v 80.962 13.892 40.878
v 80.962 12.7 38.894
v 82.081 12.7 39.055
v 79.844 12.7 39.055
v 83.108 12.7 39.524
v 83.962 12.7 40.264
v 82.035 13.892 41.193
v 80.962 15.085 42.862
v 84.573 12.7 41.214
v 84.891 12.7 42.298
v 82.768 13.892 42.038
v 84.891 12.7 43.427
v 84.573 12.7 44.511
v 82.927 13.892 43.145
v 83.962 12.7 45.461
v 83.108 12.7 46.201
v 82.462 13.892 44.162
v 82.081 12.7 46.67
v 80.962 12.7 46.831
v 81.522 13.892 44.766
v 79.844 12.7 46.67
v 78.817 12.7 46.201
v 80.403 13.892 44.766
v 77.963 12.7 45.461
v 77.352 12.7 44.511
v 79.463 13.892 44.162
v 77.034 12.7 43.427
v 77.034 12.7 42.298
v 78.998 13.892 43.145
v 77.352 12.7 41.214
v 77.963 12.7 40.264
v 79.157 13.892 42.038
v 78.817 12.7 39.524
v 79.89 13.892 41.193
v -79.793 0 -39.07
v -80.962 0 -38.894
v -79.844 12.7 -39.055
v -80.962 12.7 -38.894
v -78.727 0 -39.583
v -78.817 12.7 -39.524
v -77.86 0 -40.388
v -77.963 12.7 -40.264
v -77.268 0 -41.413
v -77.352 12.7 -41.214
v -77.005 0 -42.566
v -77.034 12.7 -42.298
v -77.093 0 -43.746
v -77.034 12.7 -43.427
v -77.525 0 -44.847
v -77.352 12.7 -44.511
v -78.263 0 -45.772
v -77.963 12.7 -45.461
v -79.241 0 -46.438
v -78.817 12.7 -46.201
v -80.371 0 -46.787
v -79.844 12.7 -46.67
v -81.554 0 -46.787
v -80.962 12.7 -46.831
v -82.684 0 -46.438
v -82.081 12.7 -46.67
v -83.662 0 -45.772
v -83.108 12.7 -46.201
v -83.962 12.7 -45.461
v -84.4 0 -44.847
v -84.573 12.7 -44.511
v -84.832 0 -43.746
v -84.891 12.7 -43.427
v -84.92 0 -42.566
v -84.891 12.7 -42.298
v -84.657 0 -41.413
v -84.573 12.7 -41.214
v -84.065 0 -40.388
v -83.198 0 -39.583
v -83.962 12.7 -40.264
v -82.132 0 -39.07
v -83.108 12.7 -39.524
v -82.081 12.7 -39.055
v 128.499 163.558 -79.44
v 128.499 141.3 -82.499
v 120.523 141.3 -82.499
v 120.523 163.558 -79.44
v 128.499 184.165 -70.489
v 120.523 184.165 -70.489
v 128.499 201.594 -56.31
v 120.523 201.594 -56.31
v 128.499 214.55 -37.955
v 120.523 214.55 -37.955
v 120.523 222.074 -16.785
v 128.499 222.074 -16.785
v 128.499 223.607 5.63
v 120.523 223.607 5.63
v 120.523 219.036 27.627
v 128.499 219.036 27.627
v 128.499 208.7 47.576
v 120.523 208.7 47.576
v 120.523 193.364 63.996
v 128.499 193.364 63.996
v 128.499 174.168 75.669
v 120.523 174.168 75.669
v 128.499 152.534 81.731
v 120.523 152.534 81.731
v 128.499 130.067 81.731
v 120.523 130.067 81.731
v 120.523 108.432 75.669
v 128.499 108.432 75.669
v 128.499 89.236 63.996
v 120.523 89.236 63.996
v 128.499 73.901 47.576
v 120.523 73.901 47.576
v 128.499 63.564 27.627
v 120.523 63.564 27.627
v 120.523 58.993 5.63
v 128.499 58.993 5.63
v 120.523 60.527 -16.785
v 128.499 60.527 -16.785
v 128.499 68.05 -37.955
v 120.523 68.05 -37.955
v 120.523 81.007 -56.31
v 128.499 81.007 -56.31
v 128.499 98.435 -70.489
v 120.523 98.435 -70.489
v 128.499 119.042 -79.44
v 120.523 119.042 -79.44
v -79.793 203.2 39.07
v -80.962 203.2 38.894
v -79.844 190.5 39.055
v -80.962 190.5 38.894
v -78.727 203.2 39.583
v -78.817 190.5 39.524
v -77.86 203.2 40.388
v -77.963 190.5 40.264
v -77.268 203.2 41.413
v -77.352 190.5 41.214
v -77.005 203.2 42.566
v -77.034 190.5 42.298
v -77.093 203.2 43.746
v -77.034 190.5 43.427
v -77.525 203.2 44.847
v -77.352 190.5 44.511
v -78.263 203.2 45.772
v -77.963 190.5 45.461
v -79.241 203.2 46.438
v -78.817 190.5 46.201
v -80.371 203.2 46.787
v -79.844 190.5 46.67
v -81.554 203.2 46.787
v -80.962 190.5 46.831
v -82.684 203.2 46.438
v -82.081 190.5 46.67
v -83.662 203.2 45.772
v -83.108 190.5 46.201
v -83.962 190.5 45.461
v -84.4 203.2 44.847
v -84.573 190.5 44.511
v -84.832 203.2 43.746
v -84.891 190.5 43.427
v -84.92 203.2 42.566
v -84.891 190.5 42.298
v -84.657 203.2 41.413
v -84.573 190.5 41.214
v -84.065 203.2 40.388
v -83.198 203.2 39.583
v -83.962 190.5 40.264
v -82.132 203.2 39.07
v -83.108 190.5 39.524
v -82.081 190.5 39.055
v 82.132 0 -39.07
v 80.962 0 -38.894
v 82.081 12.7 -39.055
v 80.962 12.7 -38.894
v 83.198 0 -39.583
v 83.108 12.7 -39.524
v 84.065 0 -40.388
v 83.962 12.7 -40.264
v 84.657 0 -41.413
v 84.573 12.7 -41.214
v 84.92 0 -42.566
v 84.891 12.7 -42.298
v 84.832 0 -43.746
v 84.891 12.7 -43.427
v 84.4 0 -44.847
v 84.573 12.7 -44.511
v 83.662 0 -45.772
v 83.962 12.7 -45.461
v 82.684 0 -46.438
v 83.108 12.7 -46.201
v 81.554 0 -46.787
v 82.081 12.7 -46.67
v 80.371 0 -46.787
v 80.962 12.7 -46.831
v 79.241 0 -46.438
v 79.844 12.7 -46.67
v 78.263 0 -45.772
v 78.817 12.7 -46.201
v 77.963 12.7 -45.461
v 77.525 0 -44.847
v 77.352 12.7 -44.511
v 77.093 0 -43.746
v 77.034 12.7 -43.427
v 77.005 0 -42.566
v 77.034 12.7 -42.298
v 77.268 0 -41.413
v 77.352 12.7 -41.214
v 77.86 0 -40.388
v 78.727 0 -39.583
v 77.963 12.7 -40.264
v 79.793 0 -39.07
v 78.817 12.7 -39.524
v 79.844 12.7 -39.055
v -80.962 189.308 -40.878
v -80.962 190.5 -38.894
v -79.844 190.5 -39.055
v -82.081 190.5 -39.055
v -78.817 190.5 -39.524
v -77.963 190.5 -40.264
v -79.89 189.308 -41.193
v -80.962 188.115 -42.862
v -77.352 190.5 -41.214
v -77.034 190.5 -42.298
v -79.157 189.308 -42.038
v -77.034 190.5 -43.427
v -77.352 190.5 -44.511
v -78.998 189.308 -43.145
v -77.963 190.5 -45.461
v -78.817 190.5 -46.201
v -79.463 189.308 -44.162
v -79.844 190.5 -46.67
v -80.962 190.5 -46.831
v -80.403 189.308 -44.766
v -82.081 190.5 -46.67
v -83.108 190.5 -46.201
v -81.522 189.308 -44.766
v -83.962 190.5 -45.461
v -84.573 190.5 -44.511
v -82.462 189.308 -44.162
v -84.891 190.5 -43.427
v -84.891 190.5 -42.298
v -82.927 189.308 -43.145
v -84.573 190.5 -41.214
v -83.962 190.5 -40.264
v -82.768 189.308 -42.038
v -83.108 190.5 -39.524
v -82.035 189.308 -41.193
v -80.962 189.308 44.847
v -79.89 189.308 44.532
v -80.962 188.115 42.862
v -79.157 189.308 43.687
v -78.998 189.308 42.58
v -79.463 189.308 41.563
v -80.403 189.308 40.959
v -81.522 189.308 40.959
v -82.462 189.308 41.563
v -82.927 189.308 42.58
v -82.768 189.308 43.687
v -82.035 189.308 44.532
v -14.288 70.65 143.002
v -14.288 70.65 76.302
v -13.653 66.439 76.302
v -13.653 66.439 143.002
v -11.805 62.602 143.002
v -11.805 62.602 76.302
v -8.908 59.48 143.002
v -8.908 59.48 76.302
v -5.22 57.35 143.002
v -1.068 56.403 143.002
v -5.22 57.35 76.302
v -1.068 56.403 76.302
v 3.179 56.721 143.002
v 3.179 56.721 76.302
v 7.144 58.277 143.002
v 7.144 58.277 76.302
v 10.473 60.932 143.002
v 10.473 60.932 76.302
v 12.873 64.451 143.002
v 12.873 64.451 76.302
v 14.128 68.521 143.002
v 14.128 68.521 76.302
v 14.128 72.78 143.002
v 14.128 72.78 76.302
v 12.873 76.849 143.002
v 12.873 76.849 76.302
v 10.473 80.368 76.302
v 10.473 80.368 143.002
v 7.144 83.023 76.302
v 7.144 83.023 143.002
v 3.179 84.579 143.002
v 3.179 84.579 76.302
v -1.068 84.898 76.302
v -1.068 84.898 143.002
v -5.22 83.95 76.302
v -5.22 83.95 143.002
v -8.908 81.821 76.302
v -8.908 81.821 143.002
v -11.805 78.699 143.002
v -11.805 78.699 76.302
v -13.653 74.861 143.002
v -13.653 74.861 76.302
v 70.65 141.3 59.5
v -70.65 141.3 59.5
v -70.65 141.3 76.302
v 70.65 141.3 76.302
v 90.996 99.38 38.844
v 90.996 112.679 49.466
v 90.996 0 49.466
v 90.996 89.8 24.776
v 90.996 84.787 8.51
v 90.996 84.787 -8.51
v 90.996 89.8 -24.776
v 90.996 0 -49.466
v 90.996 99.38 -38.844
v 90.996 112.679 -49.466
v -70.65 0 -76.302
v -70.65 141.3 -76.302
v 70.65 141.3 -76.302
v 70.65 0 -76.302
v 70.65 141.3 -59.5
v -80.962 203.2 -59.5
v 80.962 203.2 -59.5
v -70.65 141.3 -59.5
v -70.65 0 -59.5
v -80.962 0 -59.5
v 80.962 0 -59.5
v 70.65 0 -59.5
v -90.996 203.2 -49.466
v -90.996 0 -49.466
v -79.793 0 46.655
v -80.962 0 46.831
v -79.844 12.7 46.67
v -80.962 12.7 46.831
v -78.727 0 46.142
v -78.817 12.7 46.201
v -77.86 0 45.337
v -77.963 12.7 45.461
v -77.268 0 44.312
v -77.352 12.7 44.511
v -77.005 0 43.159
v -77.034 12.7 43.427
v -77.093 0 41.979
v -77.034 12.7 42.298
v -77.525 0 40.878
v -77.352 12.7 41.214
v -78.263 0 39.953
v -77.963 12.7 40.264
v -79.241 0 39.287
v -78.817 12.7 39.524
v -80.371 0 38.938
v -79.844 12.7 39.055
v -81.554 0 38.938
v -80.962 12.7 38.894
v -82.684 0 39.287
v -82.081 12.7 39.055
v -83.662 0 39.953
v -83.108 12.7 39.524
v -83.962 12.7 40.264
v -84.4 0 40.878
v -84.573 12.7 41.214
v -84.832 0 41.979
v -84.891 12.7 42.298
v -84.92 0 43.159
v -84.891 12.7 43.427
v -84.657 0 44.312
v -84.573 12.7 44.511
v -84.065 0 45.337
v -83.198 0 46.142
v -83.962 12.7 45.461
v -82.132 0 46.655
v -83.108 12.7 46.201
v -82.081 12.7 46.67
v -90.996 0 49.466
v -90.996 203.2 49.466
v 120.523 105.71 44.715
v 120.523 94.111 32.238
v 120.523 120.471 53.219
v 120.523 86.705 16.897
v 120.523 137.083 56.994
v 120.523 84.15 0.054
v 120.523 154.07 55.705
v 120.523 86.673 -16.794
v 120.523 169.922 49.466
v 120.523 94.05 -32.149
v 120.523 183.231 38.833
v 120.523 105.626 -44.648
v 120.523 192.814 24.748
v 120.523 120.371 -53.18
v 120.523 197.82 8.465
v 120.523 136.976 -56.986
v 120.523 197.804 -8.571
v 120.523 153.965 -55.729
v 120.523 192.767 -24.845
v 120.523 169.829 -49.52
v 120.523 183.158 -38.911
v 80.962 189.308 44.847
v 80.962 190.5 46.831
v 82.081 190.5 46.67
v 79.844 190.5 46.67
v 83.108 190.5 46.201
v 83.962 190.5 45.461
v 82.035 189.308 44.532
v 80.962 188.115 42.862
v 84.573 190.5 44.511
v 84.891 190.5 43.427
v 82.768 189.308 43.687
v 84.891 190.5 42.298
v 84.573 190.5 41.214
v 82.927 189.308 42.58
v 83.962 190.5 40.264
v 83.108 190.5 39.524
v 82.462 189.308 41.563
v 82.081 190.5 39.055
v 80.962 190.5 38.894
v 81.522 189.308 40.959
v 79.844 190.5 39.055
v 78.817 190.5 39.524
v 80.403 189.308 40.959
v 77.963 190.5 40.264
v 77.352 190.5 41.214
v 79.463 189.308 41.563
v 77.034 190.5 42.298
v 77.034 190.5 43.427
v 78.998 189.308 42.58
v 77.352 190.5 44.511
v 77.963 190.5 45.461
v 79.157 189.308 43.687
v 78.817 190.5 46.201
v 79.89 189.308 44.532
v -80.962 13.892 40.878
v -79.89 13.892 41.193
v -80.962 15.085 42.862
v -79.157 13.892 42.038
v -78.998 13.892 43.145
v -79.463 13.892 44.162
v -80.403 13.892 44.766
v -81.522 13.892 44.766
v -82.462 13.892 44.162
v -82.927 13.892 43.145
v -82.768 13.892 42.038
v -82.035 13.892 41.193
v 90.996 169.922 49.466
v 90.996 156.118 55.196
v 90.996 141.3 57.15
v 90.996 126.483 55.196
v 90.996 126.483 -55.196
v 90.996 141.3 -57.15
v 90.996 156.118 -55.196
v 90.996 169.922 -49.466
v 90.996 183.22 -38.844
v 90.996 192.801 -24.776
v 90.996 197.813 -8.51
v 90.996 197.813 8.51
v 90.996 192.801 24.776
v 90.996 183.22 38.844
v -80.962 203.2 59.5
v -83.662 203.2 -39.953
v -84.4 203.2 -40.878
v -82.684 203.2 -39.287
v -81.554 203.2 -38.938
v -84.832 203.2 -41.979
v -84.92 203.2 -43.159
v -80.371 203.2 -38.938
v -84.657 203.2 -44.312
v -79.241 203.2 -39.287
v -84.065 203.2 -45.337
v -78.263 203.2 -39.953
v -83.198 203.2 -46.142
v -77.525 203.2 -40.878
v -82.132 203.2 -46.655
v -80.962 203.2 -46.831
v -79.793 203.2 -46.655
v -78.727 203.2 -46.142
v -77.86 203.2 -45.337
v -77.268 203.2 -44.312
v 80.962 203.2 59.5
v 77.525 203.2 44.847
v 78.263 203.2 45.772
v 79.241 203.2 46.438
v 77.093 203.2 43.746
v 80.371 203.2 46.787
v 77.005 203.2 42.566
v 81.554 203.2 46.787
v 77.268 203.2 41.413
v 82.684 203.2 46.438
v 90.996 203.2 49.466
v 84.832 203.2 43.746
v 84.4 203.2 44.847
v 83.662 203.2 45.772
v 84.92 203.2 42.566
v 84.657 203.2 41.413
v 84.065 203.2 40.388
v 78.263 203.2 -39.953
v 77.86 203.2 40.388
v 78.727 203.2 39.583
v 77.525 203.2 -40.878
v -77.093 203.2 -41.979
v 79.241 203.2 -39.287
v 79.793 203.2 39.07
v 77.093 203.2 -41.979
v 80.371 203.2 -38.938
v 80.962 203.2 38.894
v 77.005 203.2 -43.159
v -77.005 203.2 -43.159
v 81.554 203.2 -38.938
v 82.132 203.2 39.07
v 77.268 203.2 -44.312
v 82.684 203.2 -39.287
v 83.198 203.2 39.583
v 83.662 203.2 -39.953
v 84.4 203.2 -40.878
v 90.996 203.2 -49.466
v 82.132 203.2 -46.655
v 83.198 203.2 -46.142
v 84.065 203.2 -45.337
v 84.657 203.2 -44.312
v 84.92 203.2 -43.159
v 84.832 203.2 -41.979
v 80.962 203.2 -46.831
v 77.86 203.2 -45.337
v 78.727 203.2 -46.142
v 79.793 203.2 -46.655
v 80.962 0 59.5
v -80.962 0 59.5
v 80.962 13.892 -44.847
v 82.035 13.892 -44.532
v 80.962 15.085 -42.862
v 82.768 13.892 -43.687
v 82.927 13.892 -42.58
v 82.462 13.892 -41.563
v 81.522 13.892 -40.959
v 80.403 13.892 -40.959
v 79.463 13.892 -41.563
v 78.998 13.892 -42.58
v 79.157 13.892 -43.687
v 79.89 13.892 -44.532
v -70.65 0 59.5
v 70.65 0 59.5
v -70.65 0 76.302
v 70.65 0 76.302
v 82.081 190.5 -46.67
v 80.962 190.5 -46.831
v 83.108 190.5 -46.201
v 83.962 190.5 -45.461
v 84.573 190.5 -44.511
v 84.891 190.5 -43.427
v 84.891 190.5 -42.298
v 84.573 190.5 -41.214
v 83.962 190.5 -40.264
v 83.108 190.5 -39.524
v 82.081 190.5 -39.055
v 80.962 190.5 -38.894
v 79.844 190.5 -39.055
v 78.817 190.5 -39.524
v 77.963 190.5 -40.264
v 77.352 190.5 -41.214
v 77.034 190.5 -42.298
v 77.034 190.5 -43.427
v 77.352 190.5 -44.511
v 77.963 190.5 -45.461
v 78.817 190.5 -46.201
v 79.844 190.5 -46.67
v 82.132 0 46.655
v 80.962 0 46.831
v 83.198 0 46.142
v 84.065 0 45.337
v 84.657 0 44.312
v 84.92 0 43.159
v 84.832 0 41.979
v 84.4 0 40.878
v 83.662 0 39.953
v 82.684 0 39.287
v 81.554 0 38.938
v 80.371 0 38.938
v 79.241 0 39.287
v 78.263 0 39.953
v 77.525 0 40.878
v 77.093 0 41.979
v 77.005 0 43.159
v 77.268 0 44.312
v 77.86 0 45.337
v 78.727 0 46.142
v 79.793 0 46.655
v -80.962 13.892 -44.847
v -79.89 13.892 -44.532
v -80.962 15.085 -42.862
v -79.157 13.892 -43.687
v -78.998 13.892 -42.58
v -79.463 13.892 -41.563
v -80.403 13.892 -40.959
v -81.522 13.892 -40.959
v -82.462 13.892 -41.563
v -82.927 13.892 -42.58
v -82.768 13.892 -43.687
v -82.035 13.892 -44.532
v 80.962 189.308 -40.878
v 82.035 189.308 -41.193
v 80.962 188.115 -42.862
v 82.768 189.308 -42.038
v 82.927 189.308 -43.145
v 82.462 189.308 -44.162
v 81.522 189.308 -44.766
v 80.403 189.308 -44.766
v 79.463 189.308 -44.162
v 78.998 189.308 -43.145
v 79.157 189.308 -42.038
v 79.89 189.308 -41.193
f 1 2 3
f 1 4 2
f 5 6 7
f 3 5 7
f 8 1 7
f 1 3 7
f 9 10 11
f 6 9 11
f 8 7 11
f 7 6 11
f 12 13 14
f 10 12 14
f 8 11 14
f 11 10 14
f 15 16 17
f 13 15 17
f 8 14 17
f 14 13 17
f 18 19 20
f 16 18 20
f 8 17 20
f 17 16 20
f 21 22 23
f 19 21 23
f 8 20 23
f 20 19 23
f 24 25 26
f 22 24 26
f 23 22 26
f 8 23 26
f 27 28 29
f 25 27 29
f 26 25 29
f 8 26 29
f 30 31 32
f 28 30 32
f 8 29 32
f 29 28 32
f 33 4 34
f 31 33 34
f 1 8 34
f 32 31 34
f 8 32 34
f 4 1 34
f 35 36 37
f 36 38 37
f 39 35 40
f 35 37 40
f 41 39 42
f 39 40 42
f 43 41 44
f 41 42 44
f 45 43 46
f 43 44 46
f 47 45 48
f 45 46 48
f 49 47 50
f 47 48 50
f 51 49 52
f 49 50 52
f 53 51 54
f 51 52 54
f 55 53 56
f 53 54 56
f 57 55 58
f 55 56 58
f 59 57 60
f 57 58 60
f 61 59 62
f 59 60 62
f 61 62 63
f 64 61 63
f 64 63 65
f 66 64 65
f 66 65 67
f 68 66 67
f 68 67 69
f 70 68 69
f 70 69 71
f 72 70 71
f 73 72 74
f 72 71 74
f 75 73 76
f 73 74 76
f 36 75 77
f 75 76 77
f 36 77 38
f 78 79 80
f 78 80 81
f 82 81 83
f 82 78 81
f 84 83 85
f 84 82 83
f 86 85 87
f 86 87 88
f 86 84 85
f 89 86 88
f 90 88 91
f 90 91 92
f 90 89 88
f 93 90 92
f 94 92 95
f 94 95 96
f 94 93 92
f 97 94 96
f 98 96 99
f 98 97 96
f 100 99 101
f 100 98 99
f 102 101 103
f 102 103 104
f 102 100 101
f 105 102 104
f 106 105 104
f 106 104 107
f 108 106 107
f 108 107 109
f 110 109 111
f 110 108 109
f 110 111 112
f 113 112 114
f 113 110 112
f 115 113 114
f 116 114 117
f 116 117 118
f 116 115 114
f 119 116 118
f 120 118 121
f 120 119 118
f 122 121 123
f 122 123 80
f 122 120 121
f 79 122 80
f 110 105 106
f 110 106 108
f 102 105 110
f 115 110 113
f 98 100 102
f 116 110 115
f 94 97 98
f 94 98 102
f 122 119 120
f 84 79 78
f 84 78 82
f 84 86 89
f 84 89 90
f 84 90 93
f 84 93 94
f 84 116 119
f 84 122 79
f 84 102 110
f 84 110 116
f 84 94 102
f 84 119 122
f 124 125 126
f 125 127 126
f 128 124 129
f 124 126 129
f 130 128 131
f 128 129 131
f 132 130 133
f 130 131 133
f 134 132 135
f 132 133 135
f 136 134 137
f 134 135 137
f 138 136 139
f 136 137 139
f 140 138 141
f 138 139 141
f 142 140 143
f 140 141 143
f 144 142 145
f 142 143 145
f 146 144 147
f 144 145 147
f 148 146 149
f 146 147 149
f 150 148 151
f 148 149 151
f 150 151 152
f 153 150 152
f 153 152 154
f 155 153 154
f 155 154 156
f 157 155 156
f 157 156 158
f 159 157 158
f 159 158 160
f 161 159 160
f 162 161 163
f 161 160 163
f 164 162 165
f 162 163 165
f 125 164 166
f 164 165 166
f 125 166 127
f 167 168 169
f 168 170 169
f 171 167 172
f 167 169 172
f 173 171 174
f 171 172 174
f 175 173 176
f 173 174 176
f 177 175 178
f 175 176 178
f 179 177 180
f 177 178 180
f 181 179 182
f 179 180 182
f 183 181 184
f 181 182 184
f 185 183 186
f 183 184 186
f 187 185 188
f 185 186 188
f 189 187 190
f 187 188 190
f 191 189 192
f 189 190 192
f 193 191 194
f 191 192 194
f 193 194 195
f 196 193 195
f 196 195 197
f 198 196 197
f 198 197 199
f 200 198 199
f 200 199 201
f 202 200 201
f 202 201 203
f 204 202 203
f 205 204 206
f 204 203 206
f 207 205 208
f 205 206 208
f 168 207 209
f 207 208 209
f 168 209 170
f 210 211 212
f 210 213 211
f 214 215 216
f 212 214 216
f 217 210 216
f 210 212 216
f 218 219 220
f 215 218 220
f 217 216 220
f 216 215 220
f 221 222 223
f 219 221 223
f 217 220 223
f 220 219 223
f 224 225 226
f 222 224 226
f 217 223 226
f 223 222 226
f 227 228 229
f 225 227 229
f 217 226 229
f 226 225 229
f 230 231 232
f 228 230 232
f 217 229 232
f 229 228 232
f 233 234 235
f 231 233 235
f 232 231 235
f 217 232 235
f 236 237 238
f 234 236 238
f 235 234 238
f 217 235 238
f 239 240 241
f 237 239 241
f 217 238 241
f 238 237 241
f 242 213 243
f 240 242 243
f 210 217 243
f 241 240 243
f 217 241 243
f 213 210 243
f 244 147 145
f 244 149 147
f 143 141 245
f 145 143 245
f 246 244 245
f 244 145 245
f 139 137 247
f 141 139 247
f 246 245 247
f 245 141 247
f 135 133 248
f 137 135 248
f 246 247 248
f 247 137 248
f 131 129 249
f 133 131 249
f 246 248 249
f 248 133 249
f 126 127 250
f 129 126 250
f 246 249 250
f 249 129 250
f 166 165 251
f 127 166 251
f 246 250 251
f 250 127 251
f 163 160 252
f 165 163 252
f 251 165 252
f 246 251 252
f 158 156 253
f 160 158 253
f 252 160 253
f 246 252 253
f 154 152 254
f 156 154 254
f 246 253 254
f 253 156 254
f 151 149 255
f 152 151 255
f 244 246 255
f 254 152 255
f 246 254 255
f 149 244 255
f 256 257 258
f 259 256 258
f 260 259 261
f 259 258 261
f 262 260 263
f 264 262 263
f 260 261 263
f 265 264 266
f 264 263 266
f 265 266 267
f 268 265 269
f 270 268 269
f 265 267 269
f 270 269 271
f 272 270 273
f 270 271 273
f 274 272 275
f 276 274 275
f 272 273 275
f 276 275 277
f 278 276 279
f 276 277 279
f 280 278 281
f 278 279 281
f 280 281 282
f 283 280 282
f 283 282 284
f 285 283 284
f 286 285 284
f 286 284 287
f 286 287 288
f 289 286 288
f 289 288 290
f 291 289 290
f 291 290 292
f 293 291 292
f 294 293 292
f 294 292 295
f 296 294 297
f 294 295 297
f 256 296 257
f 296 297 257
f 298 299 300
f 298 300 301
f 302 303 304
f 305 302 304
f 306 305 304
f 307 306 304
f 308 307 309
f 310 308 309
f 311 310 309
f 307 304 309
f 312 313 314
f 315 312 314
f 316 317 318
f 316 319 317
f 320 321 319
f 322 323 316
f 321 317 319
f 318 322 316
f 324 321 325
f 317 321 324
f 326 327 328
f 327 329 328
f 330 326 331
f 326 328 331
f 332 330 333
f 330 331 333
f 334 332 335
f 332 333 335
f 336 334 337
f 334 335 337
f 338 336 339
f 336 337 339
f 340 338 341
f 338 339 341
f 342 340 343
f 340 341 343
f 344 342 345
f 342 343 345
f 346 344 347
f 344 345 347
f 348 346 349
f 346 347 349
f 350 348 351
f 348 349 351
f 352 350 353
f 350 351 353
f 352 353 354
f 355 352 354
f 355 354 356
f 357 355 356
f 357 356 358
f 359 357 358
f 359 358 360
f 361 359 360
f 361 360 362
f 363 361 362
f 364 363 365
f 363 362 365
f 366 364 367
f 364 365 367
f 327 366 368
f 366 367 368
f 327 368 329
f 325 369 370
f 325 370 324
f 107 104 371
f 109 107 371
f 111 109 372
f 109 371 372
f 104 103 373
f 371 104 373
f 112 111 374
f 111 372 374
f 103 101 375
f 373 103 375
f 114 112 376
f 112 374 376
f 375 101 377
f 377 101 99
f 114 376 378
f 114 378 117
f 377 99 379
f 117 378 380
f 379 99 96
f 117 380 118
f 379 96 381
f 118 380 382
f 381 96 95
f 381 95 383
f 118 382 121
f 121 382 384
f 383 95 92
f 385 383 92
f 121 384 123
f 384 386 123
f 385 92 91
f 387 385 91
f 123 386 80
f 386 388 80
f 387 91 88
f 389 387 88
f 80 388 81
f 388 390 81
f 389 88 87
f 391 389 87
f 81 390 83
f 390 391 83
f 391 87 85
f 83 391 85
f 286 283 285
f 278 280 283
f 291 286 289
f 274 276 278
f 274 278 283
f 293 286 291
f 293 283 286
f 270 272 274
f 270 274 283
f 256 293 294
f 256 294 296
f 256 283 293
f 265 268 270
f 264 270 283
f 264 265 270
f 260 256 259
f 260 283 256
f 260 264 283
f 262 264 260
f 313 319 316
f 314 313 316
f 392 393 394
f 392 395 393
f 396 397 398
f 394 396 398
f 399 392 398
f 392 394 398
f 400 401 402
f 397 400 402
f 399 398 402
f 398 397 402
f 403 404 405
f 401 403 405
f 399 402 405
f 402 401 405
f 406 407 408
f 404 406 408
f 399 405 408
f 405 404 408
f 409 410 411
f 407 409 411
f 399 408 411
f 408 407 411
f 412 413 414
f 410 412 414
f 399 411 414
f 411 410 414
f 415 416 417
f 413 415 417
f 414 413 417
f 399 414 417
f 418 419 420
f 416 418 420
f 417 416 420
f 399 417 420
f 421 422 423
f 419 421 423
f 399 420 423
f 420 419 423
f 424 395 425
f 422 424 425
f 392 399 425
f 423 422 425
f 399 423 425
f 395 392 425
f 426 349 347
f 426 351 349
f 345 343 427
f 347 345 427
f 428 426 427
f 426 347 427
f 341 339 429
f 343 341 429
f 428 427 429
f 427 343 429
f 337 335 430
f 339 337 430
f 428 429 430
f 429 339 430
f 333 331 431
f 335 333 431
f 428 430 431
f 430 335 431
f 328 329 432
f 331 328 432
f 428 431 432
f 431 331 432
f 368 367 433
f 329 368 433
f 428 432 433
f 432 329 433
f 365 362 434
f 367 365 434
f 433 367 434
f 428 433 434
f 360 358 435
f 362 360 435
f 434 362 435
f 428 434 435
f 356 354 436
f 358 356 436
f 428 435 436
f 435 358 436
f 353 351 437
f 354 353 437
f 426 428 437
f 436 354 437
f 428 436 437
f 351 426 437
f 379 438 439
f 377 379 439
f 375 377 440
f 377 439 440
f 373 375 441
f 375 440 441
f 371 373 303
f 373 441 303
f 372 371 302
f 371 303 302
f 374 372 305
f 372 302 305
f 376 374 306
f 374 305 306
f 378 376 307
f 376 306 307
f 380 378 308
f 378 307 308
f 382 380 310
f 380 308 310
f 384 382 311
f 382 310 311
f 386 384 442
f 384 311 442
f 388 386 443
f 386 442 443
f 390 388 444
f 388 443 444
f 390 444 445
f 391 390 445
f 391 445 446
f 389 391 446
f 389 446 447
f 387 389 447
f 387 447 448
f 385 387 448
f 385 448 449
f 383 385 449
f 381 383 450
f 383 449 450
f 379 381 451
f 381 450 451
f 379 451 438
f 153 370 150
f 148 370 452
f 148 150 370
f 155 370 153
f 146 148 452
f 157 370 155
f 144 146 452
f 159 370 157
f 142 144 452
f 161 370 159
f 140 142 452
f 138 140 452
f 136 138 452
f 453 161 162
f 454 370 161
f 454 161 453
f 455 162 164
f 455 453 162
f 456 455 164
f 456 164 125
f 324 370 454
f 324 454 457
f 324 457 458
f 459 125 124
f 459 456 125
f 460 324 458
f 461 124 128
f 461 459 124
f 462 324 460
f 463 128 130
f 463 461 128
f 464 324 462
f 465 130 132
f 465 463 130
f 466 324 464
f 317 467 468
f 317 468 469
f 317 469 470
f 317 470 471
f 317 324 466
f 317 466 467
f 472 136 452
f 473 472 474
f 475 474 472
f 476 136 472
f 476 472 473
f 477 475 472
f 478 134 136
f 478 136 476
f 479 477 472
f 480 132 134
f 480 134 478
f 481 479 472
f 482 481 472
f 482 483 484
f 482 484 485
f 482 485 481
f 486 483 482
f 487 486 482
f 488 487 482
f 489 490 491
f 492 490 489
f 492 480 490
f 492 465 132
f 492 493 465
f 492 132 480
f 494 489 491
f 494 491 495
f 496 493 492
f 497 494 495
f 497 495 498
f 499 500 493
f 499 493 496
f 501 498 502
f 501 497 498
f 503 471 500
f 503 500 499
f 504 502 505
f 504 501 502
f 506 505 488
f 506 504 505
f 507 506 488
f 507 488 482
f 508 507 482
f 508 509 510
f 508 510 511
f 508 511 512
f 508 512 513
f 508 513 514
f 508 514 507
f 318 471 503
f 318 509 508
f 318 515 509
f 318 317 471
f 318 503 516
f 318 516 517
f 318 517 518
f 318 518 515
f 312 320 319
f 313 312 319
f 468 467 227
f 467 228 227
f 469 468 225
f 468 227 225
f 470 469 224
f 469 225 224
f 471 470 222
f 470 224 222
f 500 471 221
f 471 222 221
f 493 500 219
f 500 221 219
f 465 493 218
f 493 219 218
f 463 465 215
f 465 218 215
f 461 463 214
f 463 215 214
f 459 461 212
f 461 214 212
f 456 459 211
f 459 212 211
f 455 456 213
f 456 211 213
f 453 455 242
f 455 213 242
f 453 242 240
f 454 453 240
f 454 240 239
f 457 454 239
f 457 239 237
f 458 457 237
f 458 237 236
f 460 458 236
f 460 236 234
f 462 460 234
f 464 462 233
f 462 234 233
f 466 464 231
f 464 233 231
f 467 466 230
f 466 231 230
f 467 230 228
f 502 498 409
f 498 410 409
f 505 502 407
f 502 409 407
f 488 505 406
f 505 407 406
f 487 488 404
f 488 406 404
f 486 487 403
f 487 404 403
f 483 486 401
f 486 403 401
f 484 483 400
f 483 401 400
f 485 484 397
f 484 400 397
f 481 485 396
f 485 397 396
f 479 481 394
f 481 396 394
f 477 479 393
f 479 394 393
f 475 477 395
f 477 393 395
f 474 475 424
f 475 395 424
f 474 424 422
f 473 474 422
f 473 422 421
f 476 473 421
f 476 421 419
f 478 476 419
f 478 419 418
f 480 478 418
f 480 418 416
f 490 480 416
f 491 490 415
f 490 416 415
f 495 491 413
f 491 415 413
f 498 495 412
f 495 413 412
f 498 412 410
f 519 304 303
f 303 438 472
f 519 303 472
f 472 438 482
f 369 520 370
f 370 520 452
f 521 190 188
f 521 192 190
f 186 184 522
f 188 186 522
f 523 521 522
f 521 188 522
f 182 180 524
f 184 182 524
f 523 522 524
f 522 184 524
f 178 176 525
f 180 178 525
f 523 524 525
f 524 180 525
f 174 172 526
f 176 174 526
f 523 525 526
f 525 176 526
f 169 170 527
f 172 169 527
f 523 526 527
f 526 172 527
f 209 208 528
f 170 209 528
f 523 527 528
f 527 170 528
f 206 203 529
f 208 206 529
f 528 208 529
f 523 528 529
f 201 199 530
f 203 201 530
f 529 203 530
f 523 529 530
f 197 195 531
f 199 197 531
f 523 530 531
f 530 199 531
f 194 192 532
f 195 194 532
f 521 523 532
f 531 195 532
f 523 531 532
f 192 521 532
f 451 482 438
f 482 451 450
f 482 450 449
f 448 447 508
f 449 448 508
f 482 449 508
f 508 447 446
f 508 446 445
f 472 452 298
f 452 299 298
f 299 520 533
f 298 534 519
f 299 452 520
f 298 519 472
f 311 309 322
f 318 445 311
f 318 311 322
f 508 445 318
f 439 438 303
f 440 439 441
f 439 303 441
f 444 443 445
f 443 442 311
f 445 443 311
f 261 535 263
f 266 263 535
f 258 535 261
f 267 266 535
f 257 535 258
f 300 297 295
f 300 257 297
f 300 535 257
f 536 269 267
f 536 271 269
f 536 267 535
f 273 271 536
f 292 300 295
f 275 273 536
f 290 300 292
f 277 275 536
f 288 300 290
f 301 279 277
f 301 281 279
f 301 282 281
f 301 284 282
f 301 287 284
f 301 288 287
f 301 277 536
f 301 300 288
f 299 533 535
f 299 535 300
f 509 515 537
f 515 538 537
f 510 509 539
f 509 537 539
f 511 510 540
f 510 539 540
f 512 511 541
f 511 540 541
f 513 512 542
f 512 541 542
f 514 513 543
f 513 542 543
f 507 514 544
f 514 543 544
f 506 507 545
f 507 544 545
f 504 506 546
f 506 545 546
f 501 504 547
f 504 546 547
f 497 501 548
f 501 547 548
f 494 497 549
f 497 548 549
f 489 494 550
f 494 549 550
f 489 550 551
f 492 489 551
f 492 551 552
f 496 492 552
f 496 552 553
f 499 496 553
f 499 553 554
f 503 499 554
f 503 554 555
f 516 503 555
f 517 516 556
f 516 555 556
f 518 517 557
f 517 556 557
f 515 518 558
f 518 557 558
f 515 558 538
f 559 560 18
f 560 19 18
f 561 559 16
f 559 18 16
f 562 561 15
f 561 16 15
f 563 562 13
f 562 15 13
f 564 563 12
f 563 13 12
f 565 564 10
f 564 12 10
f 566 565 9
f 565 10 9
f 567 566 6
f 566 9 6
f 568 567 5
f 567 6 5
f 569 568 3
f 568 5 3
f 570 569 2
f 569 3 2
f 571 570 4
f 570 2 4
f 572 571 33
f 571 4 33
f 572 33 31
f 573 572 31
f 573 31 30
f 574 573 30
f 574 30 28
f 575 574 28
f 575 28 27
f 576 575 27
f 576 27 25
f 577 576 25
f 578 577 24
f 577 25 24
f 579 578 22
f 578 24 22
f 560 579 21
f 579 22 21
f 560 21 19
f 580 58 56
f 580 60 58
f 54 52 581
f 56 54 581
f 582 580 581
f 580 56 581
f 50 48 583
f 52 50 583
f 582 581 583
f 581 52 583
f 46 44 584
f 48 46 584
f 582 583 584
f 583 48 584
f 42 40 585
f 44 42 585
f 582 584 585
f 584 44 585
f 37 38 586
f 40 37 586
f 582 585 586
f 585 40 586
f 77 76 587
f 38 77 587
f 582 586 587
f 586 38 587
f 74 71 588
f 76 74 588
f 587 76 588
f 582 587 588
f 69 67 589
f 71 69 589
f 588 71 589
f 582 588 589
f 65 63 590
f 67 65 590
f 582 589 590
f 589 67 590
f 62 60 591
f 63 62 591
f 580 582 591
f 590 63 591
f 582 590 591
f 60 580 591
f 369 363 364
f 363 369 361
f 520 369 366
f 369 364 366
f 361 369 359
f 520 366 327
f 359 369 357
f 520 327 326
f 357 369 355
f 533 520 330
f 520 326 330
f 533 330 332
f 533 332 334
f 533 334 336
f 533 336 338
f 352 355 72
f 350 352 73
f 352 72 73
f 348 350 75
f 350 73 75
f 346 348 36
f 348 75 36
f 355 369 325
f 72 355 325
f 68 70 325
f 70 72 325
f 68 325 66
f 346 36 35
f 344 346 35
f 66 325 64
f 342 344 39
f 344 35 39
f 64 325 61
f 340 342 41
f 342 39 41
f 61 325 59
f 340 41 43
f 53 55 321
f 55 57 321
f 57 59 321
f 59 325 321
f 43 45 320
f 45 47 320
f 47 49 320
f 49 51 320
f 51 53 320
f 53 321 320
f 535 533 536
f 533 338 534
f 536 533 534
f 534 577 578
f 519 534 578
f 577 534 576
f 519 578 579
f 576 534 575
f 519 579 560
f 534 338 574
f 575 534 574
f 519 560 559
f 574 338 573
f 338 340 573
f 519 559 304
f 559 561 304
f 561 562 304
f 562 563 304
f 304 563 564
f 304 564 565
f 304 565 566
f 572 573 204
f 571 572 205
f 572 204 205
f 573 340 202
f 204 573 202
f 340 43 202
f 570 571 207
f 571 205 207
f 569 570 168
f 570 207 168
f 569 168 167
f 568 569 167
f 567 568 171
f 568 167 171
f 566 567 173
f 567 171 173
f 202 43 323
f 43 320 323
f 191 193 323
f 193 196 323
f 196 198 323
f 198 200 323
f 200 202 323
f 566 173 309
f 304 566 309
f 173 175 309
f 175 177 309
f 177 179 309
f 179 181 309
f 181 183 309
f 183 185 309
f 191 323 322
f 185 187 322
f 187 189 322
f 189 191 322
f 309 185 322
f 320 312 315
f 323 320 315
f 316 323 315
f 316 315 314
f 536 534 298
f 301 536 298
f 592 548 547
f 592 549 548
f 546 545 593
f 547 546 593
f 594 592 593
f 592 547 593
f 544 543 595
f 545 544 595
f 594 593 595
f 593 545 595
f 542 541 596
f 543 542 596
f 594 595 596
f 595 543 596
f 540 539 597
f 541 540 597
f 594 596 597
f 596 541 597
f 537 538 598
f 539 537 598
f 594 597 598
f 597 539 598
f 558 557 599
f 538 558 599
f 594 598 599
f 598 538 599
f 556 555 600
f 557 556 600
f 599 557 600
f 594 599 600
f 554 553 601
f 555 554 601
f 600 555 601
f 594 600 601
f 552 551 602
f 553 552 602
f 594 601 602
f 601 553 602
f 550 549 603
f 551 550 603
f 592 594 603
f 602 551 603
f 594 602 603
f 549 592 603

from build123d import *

# Parameters (mm, degrees)
SKETCH1_W                                 = 181.991
SKETCH1_H                                 = 118.999
BOSS_EXTRUDE1_DEPTH                       = 203.2
SKETCH2_W                                 = 141.3002
SKETCH2_H                                 = 141.3002
BOSS_EXTRUDE2_DEPTH                       = 16.8021
SKETCH3_R                                 = 14.2875
BOSS_EXTRUDE3_DEPTH                       = 66.7004
TAP_DRILL_FOR_3_8_16_TAP1_D               = 7.9375
TAP_DRILL_FOR_3_8_16_TAP1_DEPTH           = 12.7
TAP_DRILL_FOR_3_8_16_TAP1_TIP             = 2.384665582
TAP_DRILL_FOR_3_8_16_TAP1_ON_FACE_2_D     = 7.9375
TAP_DRILL_FOR_3_8_16_TAP1_ON_FACE_2_DEPTH = 12.7
TAP_DRILL_FOR_3_8_16_TAP1_ON_FACE_2_TIP   = 2.384665582
CHAMFER1_SIZE                             = 10.033
SKETCH7_R                                 = 57.15
BOSS_EXTRUDE4_DEPTH                       = 37.5031
SKETCH8_R                                 = 82.4992
BOSS_EXTRUDE5_DEPTH                       = 7.9756


with BuildPart() as part:
    # Sketch1 → Boss-Extrude1 (new body)
    with BuildSketch(Plane(origin=(0, 0, 0), x_dir=(1, 0, 0), z_dir=(0, 1, 0))):
        Rectangle(SKETCH1_W, SKETCH1_H)
    extrude(amount=BOSS_EXTRUDE1_DEPTH)

    # Sketch2 → Boss-Extrude2 (add)
    with BuildSketch(Plane.XY.offset(59.4995)):
        with Locations((0, 70.6501)):
            Rectangle(SKETCH2_W, SKETCH2_H)
    boss_extrude2 = extrude(amount=BOSS_EXTRUDE2_DEPTH)

    # Sketch3 → Boss-Extrude3 (add)
    with BuildSketch(Plane.XY.offset(76.3016)):
        with Locations(Location((0, 70.6501, 0), (0, 0, 180))):
            Circle(SKETCH3_R)
    extrude(amount=BOSS_EXTRUDE3_DEPTH)

    # Tap Drill for 3/8-16 Tap1
    with Locations(Plane(origin=(-80.9625, 0, -42.8625), x_dir=(0, 0, -1), z_dir=(0, -1, 0))):
        with Locations((0, 0), (-85.725, 0), (-85.725, 161.925), (0, 161.925)):
            Hole(TAP_DRILL_FOR_3_8_16_TAP1_D / 2, depth=TAP_DRILL_FOR_3_8_16_TAP1_DEPTH)
            with Locations((0, 0, -(TAP_DRILL_FOR_3_8_16_TAP1_DEPTH + TAP_DRILL_FOR_3_8_16_TAP1_TIP / 2))):  # 118° drill point
                Cone(0, TAP_DRILL_FOR_3_8_16_TAP1_D / 2, TAP_DRILL_FOR_3_8_16_TAP1_TIP, mode=Mode.SUBTRACT)

    # Tap Drill for 3/8-16 Tap1 on face 2
    with Locations(Plane(origin=(80.9625, 203.2, -42.8625), x_dir=(0, 0, 1), z_dir=(0, 1, 0))):
        with Locations((0, 0), (85.725, 0), (85.725, -161.925), (0, -161.925)):
            Hole(TAP_DRILL_FOR_3_8_16_TAP1_ON_FACE_2_D / 2, depth=TAP_DRILL_FOR_3_8_16_TAP1_ON_FACE_2_DEPTH)
            with Locations((0, 0, -(TAP_DRILL_FOR_3_8_16_TAP1_ON_FACE_2_DEPTH + TAP_DRILL_FOR_3_8_16_TAP1_ON_FACE_2_TIP / 2))):  # 118° drill point
                Cone(0, TAP_DRILL_FOR_3_8_16_TAP1_ON_FACE_2_D / 2, TAP_DRILL_FOR_3_8_16_TAP1_ON_FACE_2_TIP, mode=Mode.SUBTRACT)

    # Chamfer1
    chamfer1_edges = [part.edges().sort_by_distance(p)[0] for p in [
        (90.9955, 101.6, 59.4995),
        (-90.9955, 101.6, 59.4995),
        (-90.9955, 101.6, -59.4995),
        (90.9955, 101.6, -59.4995),
    ]]
    chamfer(chamfer1_edges, length=CHAMFER1_SIZE)

    # Mirror1: Boss-Extrude2 across plane
    add(boss_extrude2.mirror(Plane.XY))

    # Sketch7 → Boss-Extrude4 (add)
    with BuildSketch(Plane(origin=(90.9955, 0, 0), x_dir=(0, 0, -1), z_dir=(1, 0, 0))):
        with Locations(Location((0, 141.3002, 0), (0, 0, 149.946203095))):
            Circle(SKETCH7_R)
    extrude(amount=BOSS_EXTRUDE4_DEPTH)

    # Sketch8 → Boss-Extrude5 (add)
    with BuildSketch(Plane(origin=(128.4986, 0, 0), x_dir=(0, 0, -1), z_dir=(1, 0, 0))):
        with Locations((0, 141.3002)):
            Circle(SKETCH8_R)
    extrude(amount=-BOSS_EXTRUDE5_DEPTH)


solid = part.part
